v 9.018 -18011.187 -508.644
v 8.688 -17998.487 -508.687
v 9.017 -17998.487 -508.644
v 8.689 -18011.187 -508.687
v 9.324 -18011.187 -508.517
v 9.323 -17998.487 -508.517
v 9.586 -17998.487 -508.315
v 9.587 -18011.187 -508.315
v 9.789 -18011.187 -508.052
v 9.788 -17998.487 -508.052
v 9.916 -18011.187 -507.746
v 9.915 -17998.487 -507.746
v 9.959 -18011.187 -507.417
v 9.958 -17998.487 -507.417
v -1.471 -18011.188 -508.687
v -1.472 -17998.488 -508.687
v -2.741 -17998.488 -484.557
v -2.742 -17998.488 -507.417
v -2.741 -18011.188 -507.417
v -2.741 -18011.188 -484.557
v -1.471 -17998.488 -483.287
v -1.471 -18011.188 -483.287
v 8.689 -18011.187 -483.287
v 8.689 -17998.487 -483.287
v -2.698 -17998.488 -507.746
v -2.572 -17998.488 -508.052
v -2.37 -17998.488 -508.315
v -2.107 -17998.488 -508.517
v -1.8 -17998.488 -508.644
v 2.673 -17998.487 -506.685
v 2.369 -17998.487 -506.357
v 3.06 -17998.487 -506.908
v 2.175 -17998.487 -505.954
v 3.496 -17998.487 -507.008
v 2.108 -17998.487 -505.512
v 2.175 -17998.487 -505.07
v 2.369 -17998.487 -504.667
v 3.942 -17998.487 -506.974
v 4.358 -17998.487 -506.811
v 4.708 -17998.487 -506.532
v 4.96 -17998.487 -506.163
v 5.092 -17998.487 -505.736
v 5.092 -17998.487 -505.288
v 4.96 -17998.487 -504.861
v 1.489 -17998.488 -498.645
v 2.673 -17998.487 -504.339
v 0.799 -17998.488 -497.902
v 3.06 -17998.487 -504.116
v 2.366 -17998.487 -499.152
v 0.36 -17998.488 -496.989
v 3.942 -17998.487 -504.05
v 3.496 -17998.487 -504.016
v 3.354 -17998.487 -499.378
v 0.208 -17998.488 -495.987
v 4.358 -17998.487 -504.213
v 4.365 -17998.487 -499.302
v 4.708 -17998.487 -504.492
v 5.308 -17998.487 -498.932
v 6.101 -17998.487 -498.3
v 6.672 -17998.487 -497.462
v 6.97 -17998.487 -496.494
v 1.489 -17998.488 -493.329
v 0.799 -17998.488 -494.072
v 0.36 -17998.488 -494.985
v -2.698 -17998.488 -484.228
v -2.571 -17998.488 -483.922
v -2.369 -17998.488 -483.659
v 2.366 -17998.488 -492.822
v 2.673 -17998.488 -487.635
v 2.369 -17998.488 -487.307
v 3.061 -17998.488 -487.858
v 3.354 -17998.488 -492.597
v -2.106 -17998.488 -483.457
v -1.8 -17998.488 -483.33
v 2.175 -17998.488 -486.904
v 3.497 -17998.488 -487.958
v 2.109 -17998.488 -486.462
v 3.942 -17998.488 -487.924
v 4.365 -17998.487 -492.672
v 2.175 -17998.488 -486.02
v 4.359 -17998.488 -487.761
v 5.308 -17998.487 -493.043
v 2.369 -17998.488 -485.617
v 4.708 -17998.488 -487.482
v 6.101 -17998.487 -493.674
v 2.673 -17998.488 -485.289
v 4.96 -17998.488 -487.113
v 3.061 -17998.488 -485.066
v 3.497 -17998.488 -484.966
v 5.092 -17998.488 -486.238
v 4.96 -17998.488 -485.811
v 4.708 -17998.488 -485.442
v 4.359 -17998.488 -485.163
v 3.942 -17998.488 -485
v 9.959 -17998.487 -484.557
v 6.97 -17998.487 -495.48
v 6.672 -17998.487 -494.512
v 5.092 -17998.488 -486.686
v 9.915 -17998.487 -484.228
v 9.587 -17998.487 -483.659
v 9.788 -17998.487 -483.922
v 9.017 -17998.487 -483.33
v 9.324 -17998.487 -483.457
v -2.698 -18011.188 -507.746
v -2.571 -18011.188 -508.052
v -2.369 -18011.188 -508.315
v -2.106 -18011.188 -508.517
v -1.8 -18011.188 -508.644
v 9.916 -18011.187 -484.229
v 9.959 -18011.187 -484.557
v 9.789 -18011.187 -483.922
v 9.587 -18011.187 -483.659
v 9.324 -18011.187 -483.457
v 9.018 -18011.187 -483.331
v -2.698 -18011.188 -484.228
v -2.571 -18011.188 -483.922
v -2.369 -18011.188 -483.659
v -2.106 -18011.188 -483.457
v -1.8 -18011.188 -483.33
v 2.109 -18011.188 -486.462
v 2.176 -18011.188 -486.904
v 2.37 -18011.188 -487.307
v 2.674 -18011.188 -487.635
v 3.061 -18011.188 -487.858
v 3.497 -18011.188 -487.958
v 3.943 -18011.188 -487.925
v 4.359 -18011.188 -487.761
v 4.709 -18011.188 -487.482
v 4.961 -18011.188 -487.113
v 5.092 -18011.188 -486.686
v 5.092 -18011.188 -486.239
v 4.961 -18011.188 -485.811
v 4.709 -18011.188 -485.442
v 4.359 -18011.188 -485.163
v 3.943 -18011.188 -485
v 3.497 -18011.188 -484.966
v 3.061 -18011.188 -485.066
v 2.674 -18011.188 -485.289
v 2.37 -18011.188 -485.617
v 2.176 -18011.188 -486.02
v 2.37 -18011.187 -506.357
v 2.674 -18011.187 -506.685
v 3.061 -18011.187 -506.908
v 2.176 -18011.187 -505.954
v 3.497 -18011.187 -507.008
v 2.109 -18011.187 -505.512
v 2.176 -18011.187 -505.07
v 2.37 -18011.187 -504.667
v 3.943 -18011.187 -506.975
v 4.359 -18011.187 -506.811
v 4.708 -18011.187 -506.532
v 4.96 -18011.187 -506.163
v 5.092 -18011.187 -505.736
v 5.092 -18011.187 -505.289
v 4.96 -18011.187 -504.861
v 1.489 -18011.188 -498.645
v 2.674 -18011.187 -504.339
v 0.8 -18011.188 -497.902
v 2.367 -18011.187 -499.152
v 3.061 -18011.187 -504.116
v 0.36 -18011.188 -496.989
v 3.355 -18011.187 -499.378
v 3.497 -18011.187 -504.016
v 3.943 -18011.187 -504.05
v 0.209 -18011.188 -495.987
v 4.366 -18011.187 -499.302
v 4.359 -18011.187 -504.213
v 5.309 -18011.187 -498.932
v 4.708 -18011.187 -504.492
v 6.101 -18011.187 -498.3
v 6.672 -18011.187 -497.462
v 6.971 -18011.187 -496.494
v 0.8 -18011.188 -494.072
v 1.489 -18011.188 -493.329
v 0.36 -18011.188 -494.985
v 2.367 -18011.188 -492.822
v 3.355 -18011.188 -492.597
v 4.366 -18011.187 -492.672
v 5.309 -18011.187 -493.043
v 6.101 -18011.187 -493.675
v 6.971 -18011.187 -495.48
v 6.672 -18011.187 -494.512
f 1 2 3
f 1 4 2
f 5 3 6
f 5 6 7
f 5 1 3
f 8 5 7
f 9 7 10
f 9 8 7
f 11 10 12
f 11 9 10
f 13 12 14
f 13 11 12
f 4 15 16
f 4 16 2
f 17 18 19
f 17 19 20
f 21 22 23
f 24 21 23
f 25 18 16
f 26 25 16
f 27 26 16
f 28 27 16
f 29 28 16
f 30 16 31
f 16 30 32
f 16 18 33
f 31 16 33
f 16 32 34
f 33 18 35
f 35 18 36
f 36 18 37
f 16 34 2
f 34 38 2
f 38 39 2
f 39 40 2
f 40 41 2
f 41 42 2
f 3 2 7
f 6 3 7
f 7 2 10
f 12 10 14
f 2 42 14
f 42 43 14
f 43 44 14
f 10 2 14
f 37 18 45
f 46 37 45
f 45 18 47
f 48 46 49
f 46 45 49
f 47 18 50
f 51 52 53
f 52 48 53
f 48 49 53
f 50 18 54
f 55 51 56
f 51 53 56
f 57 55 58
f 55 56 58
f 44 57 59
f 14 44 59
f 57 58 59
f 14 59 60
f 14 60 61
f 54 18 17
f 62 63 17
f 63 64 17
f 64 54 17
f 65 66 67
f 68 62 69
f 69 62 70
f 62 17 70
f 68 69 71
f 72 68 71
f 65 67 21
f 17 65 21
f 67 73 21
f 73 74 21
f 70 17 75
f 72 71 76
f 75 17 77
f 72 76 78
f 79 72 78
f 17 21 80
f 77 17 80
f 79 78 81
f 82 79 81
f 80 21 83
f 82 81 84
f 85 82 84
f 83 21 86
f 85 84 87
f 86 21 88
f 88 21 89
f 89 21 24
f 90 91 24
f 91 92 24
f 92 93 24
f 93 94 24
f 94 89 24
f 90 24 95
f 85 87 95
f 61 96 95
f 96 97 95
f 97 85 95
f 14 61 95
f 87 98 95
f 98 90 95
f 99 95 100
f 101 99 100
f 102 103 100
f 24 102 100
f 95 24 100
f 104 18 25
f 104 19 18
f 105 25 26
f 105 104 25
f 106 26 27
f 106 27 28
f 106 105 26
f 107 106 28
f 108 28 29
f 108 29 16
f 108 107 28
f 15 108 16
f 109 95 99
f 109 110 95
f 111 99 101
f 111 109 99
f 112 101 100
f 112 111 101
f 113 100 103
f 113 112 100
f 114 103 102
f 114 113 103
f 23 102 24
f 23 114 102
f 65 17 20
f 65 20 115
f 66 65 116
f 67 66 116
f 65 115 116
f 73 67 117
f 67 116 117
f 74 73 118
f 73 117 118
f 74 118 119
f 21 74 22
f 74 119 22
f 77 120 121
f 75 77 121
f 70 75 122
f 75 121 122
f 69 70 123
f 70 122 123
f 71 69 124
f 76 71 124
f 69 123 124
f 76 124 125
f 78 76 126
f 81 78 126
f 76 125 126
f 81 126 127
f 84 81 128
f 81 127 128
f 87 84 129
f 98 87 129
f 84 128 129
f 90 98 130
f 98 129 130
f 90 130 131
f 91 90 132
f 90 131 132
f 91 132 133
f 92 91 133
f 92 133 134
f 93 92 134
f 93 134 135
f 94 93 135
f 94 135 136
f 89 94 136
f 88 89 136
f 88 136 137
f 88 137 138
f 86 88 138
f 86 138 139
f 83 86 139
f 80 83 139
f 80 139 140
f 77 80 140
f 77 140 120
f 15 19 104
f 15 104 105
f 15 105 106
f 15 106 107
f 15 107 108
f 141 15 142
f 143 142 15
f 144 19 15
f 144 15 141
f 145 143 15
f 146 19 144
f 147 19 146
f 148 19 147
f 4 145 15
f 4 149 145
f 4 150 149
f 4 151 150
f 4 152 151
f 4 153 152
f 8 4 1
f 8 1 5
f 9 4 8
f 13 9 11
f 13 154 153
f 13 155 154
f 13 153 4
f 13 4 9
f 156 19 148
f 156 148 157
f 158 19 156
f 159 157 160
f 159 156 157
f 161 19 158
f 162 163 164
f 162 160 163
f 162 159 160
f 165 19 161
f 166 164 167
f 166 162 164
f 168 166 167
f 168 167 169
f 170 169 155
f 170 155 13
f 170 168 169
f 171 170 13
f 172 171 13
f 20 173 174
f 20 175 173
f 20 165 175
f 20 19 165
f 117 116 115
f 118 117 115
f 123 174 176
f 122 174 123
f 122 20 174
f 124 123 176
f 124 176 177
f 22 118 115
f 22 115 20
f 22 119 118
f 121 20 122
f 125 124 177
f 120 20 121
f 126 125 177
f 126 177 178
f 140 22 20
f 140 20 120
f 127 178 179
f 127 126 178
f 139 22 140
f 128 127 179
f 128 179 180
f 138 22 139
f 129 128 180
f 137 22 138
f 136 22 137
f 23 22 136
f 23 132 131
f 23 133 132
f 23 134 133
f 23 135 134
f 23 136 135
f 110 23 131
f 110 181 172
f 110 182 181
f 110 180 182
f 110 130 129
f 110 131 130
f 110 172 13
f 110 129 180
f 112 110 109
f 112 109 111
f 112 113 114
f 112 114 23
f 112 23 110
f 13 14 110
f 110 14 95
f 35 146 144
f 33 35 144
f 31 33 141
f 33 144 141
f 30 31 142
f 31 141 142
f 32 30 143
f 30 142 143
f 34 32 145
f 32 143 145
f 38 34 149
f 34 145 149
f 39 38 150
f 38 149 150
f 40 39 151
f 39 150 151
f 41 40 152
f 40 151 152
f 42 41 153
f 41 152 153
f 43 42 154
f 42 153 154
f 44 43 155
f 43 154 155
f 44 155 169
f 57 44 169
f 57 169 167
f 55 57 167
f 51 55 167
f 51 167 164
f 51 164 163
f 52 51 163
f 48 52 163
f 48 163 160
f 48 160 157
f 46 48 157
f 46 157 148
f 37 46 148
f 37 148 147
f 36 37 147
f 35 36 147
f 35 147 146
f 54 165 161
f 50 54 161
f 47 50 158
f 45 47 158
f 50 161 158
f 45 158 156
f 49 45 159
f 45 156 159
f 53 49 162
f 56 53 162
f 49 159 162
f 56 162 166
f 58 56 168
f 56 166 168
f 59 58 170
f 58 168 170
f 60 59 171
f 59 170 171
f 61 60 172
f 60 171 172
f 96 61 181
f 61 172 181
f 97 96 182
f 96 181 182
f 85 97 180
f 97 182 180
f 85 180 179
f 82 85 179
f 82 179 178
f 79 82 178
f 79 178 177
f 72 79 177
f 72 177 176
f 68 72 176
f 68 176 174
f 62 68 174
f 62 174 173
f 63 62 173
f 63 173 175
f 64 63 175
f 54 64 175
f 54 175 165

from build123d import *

# Parameters (mm, degrees)
SKETCH2_W                = 12.7
SKETCH2_H                = 25.4
BOSS_EXTRUDE1_DEPTH      = 12.7
FILLET1_R                = 1.27
M8_TAPPED_HOLE1_D        = 6.8
M8_TAPPED_HOLE1_DEPTH    = 22.352
M8_TAPPED_HOLE1_TIP      = 2.042926105
F_3_0_3_DIAMETER_HOLE1_D = 3


with BuildPart() as part:
    # Sketch2 → Boss-Extrude1 (new body)
    with BuildSketch(Plane(origin=(0.747955349, -17998.493433647, -0.21189001), x_dir=(0.9999999990426253, 4.1556714470297764e-05, -1.3703612374546656e-05), z_dir=(4.155655314345303e-05, -0.9999999990672288, -1.1772652539431076e-05))):
        with Locations((2.867307998, -495.77508586)):
            Rectangle(SKETCH2_W, SKETCH2_H)
    extrude(amount=BOSS_EXTRUDE1_DEPTH)

    # Fillet1
    fillet1_edges = [part.edges().sort_by_distance(p)[0] for p in [
        (9.958907112, -18004.8373638, -483.287176858),
        (-2.741092876, -18004.83789157, -483.287002822),
        (-2.74144096, -18004.837592559, -508.687002818),
        (9.958559027, -18004.837064789, -508.687176854),
    ]]
    fillet(fillet1_edges, radius=FILLET1_R)

    # M8 Tapped Hole1
    with Locations(Plane(origin=(0.747955347, -17998.493433647, -0.21189001), x_dir=(0.9999999991365266, 4.155655299545149e-05, 4.892308607553357e-10), z_dir=(-4.155655299833127e-05, 0.9999999990672289, 1.177265256703421e-05))):
        with Locations((2.860513847, 495.775125107)):
            Hole(M8_TAPPED_HOLE1_D / 2, depth=M8_TAPPED_HOLE1_DEPTH)
            with Locations((0, 0, -(M8_TAPPED_HOLE1_DEPTH + M8_TAPPED_HOLE1_TIP / 2))):  # 118° drill point
                Cone(0, M8_TAPPED_HOLE1_D / 2, M8_TAPPED_HOLE1_TIP, mode=Mode.SUBTRACT)

    # Ø3.0 (3) Diameter Hole1 (through all)
    with Locations(Plane(origin=(0.747955347, -17998.493433647, -0.21189001), x_dir=(0.9999999991365266, 4.155655299545149e-05, 4.892308607553357e-10), z_dir=(-4.155655299833127e-05, 0.9999999990672289, 1.177265256703421e-05))):
        with Locations((2.860644379, 486.250125108), (2.860383315, 505.300125107)):
            Hole(F_3_0_3_DIAMETER_HOLE1_D / 2)


solid = part.part
